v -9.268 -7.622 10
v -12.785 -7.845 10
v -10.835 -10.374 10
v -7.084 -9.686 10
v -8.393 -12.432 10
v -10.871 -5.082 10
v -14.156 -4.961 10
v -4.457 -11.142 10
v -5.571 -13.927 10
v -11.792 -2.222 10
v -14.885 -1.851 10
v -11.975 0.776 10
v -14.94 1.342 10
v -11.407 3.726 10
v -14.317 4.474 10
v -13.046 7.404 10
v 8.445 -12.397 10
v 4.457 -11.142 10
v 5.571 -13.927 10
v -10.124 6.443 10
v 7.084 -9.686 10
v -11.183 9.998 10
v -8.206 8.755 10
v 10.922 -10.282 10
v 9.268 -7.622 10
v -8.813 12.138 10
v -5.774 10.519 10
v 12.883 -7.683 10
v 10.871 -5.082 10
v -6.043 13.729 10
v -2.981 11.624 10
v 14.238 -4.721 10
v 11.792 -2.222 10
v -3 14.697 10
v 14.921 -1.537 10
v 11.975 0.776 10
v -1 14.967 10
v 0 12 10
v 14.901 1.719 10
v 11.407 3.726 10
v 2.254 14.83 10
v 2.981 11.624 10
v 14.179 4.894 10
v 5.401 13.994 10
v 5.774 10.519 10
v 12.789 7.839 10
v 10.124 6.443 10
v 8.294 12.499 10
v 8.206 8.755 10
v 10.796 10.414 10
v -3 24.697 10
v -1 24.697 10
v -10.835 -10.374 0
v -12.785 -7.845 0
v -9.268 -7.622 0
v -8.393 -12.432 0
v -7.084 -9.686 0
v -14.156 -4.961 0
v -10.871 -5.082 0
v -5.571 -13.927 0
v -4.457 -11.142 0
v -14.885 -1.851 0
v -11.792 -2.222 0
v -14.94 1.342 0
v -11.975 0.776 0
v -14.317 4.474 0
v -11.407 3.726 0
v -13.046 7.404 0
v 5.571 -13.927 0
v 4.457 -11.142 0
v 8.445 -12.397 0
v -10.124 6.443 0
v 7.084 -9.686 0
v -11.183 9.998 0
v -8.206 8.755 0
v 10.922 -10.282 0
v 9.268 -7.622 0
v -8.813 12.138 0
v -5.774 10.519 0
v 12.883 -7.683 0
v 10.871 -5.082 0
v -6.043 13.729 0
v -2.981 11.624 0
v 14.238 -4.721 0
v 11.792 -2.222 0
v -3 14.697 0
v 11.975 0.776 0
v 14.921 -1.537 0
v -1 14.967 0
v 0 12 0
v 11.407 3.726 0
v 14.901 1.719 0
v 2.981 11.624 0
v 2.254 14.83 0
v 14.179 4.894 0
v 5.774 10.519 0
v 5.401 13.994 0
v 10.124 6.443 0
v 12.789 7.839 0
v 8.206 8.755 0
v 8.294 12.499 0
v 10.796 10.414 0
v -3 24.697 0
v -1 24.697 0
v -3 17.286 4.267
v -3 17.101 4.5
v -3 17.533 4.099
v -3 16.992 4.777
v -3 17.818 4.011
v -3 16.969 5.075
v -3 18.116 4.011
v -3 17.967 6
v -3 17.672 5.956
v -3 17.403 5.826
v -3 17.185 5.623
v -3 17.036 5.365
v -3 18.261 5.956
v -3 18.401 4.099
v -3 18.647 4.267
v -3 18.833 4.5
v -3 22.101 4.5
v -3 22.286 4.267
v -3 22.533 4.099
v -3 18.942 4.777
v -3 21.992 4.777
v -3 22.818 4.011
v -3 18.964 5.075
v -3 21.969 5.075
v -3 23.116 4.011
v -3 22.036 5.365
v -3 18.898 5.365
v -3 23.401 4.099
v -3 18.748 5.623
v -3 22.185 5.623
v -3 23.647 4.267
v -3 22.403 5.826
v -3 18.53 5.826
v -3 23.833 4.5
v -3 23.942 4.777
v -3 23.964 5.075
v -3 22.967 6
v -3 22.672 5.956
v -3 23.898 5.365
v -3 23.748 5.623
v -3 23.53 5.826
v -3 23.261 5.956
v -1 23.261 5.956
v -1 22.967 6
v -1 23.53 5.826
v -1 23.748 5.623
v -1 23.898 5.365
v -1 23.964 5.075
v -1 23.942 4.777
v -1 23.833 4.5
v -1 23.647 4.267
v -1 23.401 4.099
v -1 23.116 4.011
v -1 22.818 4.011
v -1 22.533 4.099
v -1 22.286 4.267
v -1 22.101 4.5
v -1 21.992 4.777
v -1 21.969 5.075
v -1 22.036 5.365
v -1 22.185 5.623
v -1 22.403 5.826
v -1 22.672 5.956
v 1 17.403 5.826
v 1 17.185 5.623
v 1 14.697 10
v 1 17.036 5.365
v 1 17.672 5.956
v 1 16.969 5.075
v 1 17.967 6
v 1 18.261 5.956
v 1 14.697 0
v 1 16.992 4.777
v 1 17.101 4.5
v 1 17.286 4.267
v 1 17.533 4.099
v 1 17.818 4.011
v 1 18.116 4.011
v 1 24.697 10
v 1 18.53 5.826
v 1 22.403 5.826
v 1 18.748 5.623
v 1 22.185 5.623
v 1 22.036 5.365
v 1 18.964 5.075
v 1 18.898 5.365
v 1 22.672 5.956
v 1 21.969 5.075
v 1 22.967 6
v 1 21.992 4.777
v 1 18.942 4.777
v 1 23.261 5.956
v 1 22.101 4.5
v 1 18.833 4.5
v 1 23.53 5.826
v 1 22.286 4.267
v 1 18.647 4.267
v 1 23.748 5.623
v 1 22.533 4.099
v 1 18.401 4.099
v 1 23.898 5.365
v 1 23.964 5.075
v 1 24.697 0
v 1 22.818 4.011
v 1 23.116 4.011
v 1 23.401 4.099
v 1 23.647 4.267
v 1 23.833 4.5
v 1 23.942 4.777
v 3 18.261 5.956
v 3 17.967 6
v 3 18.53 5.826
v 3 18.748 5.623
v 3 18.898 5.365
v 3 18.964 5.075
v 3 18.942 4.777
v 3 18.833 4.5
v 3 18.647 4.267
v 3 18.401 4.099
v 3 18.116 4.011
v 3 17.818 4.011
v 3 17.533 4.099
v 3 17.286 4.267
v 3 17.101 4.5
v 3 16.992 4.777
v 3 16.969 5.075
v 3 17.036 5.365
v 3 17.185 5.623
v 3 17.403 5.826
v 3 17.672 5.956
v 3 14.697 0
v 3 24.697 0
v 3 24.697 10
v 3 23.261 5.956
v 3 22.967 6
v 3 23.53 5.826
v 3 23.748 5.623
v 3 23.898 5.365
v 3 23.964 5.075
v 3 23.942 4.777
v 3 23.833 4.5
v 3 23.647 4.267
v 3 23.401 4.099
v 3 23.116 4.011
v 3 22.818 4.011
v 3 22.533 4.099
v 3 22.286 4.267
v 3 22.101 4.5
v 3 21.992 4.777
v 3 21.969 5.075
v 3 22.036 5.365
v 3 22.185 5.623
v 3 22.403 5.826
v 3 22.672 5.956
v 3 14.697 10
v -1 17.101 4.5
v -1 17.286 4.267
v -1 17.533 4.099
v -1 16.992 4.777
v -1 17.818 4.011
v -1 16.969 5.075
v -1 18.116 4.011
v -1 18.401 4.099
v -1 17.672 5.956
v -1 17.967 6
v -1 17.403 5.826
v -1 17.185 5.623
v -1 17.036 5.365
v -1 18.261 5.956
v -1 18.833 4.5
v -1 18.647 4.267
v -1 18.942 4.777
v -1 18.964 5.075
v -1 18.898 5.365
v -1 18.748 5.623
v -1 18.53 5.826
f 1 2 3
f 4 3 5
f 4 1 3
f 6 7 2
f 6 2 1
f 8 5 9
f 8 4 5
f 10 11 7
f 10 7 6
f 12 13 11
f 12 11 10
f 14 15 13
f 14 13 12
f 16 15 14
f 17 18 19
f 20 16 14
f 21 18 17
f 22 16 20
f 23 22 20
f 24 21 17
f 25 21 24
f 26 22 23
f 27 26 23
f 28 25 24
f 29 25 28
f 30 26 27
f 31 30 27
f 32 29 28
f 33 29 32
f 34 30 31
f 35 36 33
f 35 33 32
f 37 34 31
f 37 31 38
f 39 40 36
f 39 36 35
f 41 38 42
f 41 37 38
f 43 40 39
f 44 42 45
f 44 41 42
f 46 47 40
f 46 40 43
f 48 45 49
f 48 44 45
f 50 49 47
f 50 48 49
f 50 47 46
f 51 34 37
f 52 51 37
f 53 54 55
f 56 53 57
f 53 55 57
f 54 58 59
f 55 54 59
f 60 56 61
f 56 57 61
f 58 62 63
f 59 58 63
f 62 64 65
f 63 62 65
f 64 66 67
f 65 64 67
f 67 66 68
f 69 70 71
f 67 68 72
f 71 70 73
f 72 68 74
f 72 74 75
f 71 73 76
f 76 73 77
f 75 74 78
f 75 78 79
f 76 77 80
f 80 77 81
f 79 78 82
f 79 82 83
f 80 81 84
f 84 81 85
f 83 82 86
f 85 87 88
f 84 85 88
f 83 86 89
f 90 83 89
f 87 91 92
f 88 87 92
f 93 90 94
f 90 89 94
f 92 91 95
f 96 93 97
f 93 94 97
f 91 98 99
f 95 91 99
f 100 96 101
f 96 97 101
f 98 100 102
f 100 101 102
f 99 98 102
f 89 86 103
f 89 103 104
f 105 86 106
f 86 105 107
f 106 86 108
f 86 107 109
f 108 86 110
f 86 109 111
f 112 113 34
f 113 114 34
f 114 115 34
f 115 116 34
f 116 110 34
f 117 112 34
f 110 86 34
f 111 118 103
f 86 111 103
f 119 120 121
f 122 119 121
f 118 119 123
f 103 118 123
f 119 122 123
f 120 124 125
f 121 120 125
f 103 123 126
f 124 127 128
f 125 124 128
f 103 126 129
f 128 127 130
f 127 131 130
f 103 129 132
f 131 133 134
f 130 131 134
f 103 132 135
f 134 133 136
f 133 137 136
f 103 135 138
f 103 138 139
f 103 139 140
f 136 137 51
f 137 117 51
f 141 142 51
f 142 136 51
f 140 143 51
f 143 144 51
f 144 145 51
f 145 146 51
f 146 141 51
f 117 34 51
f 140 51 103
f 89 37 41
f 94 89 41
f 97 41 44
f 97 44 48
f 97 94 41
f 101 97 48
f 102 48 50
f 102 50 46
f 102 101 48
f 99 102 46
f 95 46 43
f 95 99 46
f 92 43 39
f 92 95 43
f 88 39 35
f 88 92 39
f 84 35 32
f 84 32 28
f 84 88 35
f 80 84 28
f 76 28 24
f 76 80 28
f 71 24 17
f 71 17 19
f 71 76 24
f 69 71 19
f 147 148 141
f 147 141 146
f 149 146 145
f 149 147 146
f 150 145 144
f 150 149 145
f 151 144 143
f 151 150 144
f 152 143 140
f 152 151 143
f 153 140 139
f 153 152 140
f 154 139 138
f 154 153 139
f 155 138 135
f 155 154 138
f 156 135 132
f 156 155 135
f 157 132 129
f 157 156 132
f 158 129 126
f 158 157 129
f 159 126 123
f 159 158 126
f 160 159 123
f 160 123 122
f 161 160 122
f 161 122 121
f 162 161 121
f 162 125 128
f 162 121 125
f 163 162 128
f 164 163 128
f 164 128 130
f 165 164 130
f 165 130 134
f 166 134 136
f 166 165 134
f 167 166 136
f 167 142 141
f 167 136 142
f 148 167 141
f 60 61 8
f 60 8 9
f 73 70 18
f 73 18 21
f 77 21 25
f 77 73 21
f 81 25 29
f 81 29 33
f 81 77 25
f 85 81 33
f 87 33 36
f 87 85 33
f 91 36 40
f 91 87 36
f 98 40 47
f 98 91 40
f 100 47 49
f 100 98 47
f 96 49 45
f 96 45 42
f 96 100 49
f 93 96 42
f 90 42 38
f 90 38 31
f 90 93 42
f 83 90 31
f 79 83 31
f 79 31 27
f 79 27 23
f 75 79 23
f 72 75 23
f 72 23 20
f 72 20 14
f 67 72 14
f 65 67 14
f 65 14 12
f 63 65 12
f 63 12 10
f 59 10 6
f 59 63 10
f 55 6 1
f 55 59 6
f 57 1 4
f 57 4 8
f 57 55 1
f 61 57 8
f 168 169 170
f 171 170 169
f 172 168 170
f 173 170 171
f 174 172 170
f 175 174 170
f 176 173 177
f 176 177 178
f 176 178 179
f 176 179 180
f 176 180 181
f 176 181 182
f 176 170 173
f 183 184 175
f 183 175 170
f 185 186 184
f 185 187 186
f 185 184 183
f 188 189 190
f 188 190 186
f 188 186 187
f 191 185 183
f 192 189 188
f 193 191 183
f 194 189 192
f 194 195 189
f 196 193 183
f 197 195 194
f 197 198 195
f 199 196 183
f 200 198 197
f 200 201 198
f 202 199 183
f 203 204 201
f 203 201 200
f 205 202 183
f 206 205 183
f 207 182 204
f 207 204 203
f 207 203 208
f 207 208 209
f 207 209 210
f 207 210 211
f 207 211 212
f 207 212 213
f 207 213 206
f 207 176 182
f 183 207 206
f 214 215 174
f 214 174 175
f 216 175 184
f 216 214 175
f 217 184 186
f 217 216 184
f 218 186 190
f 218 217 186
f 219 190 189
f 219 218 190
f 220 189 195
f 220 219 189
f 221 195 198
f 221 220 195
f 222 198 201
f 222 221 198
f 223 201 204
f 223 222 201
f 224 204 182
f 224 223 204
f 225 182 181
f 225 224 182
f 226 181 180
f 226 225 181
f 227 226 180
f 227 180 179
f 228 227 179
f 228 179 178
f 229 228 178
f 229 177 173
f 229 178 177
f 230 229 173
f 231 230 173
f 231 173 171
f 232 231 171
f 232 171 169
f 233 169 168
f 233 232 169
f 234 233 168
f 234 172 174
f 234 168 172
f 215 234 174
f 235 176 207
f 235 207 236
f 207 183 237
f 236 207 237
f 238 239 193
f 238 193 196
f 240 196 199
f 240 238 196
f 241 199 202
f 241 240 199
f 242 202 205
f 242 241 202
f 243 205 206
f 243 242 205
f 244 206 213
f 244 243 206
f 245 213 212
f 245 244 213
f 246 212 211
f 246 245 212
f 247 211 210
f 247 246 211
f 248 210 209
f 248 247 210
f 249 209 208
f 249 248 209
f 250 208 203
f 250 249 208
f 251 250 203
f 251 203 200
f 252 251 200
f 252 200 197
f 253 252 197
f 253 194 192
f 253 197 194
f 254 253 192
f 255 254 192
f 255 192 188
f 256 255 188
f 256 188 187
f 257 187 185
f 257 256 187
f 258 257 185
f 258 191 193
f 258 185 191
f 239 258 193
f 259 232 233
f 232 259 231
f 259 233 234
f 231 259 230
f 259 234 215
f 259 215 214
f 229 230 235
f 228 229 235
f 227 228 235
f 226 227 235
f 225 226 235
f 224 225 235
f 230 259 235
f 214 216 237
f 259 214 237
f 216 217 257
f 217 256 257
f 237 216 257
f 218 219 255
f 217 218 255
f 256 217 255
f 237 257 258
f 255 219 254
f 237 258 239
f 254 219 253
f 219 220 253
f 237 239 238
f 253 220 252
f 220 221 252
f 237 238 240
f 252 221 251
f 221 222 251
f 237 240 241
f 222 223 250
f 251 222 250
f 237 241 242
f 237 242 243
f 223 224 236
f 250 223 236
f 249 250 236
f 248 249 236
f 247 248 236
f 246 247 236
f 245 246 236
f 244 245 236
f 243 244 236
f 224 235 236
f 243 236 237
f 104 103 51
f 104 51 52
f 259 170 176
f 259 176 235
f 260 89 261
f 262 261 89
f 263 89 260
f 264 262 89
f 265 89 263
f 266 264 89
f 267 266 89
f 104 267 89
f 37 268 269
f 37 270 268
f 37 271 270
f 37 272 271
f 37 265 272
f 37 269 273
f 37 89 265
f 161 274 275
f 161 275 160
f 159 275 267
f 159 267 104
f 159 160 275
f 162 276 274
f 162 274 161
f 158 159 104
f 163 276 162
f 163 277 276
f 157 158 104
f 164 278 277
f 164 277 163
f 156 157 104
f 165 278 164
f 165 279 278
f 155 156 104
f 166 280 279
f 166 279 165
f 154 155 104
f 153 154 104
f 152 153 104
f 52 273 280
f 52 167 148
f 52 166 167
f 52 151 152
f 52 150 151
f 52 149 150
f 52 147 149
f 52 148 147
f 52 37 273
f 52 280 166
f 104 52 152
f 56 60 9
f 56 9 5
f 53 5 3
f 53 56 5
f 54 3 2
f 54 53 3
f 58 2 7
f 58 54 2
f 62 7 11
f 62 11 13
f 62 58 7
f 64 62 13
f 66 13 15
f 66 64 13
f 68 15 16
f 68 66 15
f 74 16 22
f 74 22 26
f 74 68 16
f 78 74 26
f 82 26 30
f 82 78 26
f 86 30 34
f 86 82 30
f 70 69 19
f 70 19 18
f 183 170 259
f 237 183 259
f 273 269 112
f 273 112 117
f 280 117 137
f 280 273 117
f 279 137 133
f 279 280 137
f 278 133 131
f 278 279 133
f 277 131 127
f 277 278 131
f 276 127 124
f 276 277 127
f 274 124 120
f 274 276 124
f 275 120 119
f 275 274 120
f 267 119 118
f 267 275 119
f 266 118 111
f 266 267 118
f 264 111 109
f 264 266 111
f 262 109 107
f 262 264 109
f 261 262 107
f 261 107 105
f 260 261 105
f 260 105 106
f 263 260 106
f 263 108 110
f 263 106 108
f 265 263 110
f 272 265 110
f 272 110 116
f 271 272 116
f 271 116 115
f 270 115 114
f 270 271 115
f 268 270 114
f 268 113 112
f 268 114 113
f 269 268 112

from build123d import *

# Parameters (mm, degrees)
EXTRUDE_THIN1_DEPTH     = 10
SKETCH3_W               = 2
SKETCH3_H               = 10
EXTRUDE_THIN2_DEPTH     = 10
SKETCH4_W               = 2
SKETCH4_H               = 10
EXTRUDE_THIN3_DEPTH     = 10
CUT_EXTRUDE1_DEPTH      = 33.154918273
CUT_EXTRUDE1_DEPTH_BACK = 33.154918273
SKETCH5_R               = 1


with BuildPart() as part:
    # Sketch1 → Extrude-Thin1 (new body)
    with BuildSketch(Plane.XY):
        with BuildLine():
            ThreePointArc((4.456688116, -11.141720291), (0, 12), (-4.456688116, -11.141720291))
            Line((-4.456688116, -11.141720291), (-5.570860145, -13.927150363))
            ThreePointArc((-5.570860145, -13.927150363), (0, 15), (5.570860145, -13.927150363))
            Line((5.570860145, -13.927150363), (4.456688116, -11.141720291))
        make_face()
    extrude(amount=EXTRUDE_THIN1_DEPTH)

    # Sketch3 → Extrude-Thin2 (add)
    with BuildSketch(Plane.XY.offset(10)):
        with Locations((-2, 19.696938457)):
            Rectangle(SKETCH3_W, SKETCH3_H)
    extrude(amount=-EXTRUDE_THIN2_DEPTH)


with BuildPart() as body_2:
    # Sketch4 → Extrude-Thin3 (new body)
    with BuildSketch(Plane.XY):
        with Locations((2, 19.696938457)):
            Rectangle(SKETCH4_W, SKETCH4_H)
    extrude(amount=EXTRUDE_THIN3_DEPTH)


with BuildPart() as cut_extrude1_tool:
    # Sketch5 → Cut-Extrude1 (new, two sides: drawn at the far end of the back side and taken through both)
    with BuildSketch(Plane.ZY.offset(3).offset(-CUT_EXTRUDE1_DEPTH_BACK)):
        with Locations((5, 22.966629547)):
            Circle(SKETCH5_R)
        with Locations((5, 17.966629547)):
            Circle(SKETCH5_R)
    extrude(amount=CUT_EXTRUDE1_DEPTH + CUT_EXTRUDE1_DEPTH_BACK)


with BuildPart() as part_1:
    add(part.part)

    # Cut-Extrude1: cut by cut_extrude1_tool
    add(cut_extrude1_tool.part, mode=Mode.SUBTRACT)


with BuildPart() as body_2_1:
    add(body_2.part)

    # Cut-Extrude1: cut by cut_extrude1_tool
    add(cut_extrude1_tool.part, mode=Mode.SUBTRACT)


solid = Compound([part_1.part, body_2_1.part])
